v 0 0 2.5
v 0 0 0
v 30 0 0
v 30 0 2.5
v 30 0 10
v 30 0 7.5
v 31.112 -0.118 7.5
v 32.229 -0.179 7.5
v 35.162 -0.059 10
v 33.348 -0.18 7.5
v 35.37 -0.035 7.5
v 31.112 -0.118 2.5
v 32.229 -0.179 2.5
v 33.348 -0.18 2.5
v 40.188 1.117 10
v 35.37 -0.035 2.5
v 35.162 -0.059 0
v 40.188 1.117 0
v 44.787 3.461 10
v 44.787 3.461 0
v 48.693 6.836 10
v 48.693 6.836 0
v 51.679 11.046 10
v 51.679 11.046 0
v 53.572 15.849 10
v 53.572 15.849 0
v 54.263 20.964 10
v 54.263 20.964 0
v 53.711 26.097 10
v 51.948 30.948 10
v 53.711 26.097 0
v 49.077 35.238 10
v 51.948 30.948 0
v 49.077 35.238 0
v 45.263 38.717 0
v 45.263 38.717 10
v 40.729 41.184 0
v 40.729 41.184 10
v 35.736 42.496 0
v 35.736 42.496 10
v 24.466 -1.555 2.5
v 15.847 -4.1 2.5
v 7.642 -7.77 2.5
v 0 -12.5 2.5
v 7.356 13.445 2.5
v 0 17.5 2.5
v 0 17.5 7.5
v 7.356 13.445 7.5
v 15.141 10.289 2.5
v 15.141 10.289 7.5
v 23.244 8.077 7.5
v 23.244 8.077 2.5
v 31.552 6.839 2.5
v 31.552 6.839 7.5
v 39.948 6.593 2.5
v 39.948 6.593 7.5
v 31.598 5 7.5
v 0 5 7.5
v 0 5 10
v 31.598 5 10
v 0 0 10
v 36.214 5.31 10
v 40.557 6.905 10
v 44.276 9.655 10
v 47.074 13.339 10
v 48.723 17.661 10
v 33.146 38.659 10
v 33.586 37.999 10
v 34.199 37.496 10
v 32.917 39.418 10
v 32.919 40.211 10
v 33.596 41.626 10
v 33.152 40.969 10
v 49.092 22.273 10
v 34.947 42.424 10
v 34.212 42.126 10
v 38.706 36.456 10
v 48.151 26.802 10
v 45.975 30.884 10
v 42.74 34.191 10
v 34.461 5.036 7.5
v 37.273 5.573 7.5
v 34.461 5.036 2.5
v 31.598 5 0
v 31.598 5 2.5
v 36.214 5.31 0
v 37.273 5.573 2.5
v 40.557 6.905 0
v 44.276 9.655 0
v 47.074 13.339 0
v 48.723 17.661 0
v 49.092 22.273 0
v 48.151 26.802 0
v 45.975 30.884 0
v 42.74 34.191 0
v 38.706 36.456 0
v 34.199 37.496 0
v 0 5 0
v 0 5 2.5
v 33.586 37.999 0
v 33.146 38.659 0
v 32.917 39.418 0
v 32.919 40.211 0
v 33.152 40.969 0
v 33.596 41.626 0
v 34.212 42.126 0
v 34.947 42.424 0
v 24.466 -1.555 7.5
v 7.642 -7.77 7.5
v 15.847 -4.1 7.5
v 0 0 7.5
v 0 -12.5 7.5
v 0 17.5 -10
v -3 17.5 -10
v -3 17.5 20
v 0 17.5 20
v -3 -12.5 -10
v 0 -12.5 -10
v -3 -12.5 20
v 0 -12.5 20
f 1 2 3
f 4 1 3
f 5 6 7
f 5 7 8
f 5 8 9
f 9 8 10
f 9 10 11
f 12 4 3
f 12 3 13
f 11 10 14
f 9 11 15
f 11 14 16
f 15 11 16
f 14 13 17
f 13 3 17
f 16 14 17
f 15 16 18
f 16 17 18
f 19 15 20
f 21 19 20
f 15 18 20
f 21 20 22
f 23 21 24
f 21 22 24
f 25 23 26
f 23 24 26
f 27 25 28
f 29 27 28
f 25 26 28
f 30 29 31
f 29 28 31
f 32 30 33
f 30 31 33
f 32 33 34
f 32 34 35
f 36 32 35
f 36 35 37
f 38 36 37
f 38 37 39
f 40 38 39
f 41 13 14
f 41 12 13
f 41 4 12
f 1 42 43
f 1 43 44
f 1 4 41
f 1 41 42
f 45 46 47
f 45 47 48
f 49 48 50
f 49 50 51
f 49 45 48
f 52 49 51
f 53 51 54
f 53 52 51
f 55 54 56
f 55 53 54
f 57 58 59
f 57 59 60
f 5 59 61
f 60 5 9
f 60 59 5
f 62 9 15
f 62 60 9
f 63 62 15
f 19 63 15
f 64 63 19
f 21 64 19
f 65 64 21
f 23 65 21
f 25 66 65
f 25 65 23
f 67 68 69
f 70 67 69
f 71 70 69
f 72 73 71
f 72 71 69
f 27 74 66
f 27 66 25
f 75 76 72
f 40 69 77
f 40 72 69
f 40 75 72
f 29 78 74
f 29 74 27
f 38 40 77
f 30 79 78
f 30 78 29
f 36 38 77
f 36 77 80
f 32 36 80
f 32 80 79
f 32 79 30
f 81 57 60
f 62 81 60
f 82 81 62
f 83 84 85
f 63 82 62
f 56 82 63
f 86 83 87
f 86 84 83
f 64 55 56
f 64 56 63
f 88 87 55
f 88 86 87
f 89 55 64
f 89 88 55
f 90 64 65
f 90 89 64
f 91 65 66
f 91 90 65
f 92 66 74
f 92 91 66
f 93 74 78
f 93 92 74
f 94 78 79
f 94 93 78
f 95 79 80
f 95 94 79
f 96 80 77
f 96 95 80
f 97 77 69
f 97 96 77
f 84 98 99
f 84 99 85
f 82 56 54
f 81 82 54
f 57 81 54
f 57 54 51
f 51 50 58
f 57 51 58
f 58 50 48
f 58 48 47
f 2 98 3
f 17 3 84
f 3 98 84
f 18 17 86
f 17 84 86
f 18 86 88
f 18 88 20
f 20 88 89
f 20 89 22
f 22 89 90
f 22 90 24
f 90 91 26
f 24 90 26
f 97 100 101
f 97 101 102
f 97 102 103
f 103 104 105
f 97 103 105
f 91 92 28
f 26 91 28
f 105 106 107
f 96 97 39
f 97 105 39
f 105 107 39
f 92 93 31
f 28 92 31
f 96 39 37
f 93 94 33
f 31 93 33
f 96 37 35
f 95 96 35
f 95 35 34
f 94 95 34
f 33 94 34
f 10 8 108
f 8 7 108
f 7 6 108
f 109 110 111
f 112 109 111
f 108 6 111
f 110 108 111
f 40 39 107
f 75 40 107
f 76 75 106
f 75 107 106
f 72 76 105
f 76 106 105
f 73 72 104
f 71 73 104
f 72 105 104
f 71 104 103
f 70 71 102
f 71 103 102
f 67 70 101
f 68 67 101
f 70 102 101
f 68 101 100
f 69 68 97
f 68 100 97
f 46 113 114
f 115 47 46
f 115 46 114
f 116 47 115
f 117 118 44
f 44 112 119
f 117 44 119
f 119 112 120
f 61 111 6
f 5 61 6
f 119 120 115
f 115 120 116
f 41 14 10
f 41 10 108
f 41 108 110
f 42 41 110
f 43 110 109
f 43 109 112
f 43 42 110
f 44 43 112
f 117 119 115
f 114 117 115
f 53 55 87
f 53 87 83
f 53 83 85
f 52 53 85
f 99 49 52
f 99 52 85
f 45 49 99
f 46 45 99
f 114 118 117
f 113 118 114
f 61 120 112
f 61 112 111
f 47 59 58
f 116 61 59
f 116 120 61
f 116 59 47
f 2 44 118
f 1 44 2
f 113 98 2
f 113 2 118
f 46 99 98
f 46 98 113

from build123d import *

# Parameters (mm, degrees)
PAD_DEPTH    = 10
SKETCH001_W  = 30
SKETCH001_H  = 30
PAD001_DEPTH = 3
PAD002_DEPTH = 5


with BuildPart() as part:
    # Sketch → Pad (new body)
    with BuildSketch(Plane.XY):
        with BuildLine():
            Line((0, 0), (30, 0))
            ThreePointArc((30, 0), (54.07202, 18.385627), (35.736453, 42.495799))
            ThreePointArc((35.736453, 42.495799), (33.00775, 40.598561), (34.198631, 37.495799))
            ThreePointArc((31.598491, 5), (49.072145, 19.953776), (34.198631, 37.495799))
            Line((0, 5), (31.598491, 5))
            Line((0, 0), (0, 5))
        make_face()
    extrude(amount=PAD_DEPTH)

    # Sketch001 → Pad001 (join)
    with BuildSketch(Plane.YZ):
        with Locations((2.5, 5)):
            Rectangle(SKETCH001_W, SKETCH001_H)
    extrude(amount=-PAD001_DEPTH)

    # Sketch002 → Pad002 (join)
    with BuildSketch(Plane.XY.offset(2.5)):
        with BuildLine():
            ThreePointArc((0, 17.5), (19.159552, 9.062724), (39.948439, 6.593251))
            Line((39.948439, 6.593251), (35.370493, -0.035051))
            ThreePointArc((35.370493, -0.035051), (16.800197, -3.756112), (0, -12.5))
            Line((0, 17.5), (0, -12.5))
        make_face()
    extrude(amount=PAD002_DEPTH)


solid = part.part
